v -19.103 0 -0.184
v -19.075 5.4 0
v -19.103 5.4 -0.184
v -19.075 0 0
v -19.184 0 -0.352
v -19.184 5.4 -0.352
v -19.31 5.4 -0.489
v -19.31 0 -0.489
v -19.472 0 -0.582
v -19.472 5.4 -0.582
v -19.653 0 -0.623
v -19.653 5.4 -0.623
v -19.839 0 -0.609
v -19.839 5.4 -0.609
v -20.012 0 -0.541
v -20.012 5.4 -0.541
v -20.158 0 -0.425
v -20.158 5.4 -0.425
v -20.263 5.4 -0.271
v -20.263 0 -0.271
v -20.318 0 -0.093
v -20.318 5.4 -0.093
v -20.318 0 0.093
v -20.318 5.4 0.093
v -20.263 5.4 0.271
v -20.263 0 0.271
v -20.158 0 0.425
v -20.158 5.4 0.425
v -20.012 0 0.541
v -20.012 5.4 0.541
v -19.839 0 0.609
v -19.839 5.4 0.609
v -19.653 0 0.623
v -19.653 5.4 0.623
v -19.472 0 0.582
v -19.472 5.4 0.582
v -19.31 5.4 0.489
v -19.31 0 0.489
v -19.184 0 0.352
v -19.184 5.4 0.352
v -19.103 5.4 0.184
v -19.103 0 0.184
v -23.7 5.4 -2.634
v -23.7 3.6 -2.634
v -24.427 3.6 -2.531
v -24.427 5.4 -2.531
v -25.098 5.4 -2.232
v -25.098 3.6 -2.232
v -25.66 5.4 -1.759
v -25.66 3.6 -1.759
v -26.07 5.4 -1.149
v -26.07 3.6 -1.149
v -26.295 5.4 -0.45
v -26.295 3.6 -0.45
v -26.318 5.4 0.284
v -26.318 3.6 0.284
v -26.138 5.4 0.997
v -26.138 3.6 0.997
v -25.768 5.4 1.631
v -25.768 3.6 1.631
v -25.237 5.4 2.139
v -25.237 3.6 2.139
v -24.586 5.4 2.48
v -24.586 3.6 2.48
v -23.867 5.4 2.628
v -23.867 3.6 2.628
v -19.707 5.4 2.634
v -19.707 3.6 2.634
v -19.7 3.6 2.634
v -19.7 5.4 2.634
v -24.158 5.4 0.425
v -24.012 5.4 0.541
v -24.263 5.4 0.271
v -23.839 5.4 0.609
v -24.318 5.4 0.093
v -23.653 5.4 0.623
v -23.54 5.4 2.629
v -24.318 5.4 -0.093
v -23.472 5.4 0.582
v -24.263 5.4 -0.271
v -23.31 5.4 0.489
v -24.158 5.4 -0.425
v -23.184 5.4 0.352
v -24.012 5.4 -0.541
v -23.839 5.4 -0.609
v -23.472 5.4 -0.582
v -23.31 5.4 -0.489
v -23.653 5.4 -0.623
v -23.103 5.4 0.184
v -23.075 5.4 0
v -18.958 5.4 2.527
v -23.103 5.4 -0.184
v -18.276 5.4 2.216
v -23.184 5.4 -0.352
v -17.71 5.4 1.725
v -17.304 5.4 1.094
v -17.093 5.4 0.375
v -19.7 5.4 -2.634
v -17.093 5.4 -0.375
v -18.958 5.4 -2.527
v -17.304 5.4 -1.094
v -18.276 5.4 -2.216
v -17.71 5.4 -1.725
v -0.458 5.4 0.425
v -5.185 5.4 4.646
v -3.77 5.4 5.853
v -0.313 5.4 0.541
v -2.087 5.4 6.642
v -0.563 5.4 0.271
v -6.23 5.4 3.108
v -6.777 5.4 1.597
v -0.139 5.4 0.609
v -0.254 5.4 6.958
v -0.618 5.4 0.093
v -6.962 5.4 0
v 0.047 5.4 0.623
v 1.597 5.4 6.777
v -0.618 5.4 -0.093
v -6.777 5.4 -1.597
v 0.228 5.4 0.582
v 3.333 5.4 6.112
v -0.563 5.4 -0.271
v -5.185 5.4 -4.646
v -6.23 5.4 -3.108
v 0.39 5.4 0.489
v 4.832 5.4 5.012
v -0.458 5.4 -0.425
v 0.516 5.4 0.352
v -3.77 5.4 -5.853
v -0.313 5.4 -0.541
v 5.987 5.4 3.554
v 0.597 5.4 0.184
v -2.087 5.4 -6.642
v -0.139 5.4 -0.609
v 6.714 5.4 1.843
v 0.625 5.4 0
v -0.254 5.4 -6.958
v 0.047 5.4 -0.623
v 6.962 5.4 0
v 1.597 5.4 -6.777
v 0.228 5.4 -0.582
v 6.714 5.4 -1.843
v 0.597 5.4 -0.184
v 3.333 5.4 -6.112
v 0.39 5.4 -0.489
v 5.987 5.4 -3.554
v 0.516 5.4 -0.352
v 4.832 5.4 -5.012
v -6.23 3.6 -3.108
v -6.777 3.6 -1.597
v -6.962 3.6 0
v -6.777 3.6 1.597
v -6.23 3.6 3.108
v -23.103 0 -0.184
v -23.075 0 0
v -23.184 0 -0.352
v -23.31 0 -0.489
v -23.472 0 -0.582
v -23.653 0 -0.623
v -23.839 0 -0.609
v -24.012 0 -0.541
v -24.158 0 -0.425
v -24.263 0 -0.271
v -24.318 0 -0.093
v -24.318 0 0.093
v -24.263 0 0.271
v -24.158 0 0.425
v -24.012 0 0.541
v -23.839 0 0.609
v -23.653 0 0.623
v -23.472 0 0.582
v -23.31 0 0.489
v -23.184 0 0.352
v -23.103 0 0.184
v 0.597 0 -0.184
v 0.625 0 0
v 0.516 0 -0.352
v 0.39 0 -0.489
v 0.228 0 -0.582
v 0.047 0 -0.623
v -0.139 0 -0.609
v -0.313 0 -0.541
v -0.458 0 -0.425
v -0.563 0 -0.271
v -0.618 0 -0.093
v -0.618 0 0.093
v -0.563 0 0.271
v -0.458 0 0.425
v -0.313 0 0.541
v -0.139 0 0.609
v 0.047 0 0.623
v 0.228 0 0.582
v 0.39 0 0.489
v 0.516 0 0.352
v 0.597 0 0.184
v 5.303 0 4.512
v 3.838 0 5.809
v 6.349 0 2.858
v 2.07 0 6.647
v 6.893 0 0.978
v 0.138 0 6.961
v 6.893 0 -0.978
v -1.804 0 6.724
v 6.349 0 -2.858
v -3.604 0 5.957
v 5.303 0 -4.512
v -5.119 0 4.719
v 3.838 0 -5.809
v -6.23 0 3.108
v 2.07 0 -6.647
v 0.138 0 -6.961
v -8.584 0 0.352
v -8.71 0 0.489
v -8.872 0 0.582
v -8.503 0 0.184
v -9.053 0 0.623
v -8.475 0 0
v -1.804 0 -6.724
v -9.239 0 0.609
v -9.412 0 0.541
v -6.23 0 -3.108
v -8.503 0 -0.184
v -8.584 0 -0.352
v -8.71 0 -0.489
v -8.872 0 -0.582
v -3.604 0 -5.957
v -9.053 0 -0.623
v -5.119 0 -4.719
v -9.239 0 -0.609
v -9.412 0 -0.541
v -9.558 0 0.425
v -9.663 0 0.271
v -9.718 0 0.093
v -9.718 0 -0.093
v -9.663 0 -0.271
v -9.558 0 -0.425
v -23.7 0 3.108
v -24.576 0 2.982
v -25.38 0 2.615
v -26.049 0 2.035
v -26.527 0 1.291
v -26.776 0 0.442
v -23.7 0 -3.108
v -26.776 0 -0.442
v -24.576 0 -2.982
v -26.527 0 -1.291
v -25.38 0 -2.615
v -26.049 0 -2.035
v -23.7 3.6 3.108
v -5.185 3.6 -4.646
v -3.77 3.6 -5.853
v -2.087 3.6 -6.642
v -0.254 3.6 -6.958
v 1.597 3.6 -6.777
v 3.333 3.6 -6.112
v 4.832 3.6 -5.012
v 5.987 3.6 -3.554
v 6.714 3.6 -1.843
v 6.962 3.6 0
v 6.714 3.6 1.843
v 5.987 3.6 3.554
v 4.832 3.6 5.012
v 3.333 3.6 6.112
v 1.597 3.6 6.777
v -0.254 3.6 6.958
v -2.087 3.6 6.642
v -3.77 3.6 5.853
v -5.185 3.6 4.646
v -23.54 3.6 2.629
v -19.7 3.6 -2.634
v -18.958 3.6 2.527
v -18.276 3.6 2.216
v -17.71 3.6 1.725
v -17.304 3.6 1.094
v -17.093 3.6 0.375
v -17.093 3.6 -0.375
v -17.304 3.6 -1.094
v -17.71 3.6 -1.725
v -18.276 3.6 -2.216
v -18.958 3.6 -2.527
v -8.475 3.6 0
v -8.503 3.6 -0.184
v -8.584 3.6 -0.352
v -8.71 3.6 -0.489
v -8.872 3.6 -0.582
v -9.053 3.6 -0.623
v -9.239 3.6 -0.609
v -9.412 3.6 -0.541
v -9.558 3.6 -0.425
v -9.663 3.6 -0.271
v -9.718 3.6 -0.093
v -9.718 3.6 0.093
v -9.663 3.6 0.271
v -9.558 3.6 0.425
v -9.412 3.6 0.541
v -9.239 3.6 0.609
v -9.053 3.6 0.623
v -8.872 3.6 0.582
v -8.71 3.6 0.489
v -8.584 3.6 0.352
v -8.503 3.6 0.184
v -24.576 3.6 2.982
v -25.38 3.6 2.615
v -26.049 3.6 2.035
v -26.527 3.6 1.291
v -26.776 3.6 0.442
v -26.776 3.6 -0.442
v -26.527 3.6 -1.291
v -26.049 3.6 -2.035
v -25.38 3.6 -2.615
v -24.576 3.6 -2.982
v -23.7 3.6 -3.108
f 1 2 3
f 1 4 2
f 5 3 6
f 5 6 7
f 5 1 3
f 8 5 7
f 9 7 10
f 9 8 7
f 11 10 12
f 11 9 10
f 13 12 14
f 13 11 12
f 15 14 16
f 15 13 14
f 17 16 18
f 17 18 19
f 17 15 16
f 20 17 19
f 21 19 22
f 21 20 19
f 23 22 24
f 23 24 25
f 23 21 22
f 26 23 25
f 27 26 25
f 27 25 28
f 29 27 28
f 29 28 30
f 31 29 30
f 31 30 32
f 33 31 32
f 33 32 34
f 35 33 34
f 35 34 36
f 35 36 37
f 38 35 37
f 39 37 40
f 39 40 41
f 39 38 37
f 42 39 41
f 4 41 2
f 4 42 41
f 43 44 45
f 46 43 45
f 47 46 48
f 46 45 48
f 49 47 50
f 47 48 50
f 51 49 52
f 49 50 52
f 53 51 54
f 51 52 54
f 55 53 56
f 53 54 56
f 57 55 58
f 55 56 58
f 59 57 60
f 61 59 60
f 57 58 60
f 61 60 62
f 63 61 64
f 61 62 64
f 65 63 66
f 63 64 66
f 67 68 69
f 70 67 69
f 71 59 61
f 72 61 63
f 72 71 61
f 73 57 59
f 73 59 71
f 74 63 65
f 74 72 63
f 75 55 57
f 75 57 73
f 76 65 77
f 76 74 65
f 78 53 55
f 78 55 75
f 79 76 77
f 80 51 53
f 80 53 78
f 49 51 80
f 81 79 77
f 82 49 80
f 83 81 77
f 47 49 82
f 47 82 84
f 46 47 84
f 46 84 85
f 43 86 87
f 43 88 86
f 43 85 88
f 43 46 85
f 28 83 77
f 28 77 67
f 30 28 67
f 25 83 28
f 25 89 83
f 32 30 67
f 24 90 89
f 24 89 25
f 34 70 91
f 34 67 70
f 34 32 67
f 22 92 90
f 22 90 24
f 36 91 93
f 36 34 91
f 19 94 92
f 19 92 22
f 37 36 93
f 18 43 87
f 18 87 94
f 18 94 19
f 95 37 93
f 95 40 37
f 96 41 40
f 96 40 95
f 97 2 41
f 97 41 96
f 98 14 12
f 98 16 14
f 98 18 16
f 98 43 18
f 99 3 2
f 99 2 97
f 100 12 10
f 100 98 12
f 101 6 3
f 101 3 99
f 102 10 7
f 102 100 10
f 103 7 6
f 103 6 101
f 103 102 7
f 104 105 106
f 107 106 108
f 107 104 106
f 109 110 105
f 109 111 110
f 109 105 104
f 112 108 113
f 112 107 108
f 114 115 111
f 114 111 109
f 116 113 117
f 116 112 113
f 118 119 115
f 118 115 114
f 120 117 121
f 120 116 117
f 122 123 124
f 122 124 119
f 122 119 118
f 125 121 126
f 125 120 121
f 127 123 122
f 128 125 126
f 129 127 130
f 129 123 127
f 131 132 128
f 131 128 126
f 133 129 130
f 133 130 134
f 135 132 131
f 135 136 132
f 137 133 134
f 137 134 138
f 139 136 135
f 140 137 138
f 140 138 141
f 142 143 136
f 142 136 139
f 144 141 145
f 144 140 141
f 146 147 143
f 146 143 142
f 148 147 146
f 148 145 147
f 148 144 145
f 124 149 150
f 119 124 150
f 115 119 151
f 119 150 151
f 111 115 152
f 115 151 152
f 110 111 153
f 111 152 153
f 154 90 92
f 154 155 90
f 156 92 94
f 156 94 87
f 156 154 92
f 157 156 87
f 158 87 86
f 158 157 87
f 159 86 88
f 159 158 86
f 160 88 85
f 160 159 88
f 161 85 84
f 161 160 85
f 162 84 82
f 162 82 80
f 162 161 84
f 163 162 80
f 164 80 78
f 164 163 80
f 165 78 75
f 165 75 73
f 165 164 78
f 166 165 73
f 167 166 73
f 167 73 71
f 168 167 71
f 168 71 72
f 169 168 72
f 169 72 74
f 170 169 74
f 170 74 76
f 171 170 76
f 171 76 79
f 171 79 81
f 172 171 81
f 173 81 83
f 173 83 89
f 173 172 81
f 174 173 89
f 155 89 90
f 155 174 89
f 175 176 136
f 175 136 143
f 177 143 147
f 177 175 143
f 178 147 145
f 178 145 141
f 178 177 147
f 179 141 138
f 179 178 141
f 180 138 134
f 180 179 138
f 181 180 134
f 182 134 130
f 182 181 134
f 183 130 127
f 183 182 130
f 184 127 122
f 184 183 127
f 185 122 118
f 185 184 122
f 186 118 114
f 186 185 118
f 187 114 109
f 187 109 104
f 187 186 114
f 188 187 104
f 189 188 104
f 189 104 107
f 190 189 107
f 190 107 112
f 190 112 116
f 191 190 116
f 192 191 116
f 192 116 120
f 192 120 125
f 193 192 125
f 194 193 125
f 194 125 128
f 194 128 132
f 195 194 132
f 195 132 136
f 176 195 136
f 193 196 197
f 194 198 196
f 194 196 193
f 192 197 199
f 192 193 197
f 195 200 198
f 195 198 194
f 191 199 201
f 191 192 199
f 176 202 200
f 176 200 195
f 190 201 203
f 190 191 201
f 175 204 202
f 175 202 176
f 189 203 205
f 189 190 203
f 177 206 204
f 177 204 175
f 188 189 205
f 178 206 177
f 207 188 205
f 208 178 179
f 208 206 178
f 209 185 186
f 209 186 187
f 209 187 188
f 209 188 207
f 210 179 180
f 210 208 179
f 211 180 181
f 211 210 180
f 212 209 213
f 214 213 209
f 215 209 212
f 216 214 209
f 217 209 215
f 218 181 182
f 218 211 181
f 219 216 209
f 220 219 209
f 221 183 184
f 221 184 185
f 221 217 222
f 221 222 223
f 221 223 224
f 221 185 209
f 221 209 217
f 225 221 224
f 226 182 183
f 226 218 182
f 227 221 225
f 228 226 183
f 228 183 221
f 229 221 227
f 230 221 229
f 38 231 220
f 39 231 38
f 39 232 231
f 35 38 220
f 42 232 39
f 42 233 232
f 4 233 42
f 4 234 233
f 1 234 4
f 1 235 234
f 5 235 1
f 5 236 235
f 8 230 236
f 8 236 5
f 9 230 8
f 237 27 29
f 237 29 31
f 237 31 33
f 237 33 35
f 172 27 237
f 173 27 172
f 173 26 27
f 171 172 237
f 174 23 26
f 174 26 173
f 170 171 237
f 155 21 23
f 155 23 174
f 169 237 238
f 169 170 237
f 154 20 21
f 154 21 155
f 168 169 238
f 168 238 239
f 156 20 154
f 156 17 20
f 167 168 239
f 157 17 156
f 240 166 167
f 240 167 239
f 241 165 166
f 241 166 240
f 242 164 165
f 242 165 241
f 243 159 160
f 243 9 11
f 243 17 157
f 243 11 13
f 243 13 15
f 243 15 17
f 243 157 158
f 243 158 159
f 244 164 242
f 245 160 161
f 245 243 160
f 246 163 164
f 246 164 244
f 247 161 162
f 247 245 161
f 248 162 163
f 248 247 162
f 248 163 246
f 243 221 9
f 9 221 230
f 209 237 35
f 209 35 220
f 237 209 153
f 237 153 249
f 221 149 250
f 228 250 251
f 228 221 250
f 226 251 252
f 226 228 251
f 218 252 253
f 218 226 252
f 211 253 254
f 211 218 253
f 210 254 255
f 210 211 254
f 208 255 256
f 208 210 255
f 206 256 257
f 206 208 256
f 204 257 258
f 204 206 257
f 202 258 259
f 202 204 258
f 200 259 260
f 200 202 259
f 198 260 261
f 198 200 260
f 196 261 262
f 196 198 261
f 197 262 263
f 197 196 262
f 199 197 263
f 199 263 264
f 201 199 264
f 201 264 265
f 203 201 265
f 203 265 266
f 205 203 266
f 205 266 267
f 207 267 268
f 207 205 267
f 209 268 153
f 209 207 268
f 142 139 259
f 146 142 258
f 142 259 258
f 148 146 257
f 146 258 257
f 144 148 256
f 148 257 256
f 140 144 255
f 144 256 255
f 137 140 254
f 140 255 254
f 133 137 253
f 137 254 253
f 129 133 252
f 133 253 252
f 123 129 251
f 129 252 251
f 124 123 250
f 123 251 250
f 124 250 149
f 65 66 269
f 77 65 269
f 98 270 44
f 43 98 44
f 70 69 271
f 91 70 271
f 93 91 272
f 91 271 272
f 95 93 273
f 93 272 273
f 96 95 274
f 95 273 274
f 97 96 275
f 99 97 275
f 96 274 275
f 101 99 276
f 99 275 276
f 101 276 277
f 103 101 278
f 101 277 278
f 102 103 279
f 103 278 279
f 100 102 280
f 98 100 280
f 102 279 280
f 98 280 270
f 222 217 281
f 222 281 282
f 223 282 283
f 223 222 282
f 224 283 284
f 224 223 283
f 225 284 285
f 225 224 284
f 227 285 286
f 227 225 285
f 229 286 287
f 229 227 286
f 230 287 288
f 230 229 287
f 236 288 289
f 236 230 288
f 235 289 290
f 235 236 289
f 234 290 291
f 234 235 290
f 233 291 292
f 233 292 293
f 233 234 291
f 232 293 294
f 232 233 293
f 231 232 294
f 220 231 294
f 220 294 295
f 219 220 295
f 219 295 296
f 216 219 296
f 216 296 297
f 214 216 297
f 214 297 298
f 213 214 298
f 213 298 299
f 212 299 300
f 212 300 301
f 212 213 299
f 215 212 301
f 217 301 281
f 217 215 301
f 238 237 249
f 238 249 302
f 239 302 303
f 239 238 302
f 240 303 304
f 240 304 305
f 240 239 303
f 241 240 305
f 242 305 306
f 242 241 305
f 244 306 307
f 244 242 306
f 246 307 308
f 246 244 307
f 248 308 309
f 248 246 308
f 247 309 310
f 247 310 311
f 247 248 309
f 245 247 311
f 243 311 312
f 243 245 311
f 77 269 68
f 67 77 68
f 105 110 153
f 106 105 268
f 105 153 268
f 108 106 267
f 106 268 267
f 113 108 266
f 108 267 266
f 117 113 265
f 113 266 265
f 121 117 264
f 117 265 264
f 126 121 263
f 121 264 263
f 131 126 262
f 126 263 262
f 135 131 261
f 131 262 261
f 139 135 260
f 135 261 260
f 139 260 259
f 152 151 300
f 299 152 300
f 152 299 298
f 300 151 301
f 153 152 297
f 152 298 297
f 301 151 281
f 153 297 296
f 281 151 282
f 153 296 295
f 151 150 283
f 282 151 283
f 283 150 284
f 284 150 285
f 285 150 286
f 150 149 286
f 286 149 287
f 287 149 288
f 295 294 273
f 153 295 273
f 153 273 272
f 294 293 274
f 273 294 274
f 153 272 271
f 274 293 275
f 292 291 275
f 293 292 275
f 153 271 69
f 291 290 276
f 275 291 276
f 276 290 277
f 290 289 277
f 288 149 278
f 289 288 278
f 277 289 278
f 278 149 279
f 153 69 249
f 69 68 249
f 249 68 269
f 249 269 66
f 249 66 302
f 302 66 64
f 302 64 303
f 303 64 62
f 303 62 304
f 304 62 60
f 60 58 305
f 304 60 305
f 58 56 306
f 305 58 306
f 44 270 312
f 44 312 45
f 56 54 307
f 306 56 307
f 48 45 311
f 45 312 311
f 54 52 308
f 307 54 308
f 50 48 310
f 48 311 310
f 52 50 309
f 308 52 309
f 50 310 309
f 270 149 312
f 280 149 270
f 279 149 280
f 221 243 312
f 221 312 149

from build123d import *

# Parameters (mm, degrees)
SKETCH1_R           = 0.625
BOSS_EXTRUDE1_DEPTH = 3.6
SKETCH2_R           = 0.625
BOSS_EXTRUDE2_DEPTH = 1.8


with BuildPart() as part:
    # Sketch1 → Boss-Extrude1 (new body)
    with BuildSketch(Plane(origin=(0, 0, 0), x_dir=(1, 0, 0), z_dir=(0, 1, 0))):
        with BuildLine():
            Line((-23.7, 3.107973286), (-6.230065085, 3.107973286))
            ThreePointArc((-6.230065085, 3.107973286), (6.962270385, 0), (-6.230065085, -3.107973286))
            Line((-6.230065085, -3.107973286), (-23.7, -3.107973286))
            ThreePointArc((-23.7, -3.107973286), (-26.807973286, 0), (-23.7, 3.107973286))
        make_face()
        with Locations((-23.7, 0)):
            Circle(SKETCH1_R, mode=Mode.SUBTRACT)
        with Locations((-19.7, 0)):
            Circle(SKETCH1_R, mode=Mode.SUBTRACT)
        with Locations((-9.1, 0)):
            Circle(SKETCH1_R, mode=Mode.SUBTRACT)
        Circle(SKETCH1_R, mode=Mode.SUBTRACT)
    extrude(amount=BOSS_EXTRUDE1_DEPTH)

    # Sketch2 → Boss-Extrude2 (add)
    with BuildSketch(Plane(origin=(0, 3.6, 0), x_dir=(1, 0, 0), z_dir=(0, 1, 0))):
        with BuildLine():
            ThreePointArc((-19.7, -2.633766086), (-17.066233914, 0), (-19.7, 2.633766086))
            Line((-19.7, 2.633766086), (-23.7, 2.633766086))
            ThreePointArc((-23.7, 2.633766086), (-26.332441924, 0.083506378), (-23.866928789, -2.628470768))
            Line((-23.866928789, -2.628470768), (-23.539752243, -2.628886543))
            Line((-23.539752243, -2.628886543), (-19.706693951, -2.63375758))
            Line((-19.706693951, -2.63375758), (-19.7, -2.633766086))
        make_face()
        with Locations((-19.7, 0)):
            Circle(SKETCH2_R, mode=Mode.SUBTRACT)
        with Locations((-23.7, 0)):
            Circle(SKETCH2_R, mode=Mode.SUBTRACT)
        with BuildLine():
            ThreePointArc((-6.230065085, -3.107973286), (1.596529247, -6.776747249), (6.962270385, 0))
            ThreePointArc((6.962270385, 0), (1.596529247, 6.776747249), (-6.230065085, 3.107973286))
            ThreePointArc((-6.230065085, 3.107973286), (-6.962270385, 0), (-6.230065085, -3.107973286))
        make_face()
        Circle(SKETCH2_R, mode=Mode.SUBTRACT)
    extrude(amount=BOSS_EXTRUDE2_DEPTH)


solid = part.part
